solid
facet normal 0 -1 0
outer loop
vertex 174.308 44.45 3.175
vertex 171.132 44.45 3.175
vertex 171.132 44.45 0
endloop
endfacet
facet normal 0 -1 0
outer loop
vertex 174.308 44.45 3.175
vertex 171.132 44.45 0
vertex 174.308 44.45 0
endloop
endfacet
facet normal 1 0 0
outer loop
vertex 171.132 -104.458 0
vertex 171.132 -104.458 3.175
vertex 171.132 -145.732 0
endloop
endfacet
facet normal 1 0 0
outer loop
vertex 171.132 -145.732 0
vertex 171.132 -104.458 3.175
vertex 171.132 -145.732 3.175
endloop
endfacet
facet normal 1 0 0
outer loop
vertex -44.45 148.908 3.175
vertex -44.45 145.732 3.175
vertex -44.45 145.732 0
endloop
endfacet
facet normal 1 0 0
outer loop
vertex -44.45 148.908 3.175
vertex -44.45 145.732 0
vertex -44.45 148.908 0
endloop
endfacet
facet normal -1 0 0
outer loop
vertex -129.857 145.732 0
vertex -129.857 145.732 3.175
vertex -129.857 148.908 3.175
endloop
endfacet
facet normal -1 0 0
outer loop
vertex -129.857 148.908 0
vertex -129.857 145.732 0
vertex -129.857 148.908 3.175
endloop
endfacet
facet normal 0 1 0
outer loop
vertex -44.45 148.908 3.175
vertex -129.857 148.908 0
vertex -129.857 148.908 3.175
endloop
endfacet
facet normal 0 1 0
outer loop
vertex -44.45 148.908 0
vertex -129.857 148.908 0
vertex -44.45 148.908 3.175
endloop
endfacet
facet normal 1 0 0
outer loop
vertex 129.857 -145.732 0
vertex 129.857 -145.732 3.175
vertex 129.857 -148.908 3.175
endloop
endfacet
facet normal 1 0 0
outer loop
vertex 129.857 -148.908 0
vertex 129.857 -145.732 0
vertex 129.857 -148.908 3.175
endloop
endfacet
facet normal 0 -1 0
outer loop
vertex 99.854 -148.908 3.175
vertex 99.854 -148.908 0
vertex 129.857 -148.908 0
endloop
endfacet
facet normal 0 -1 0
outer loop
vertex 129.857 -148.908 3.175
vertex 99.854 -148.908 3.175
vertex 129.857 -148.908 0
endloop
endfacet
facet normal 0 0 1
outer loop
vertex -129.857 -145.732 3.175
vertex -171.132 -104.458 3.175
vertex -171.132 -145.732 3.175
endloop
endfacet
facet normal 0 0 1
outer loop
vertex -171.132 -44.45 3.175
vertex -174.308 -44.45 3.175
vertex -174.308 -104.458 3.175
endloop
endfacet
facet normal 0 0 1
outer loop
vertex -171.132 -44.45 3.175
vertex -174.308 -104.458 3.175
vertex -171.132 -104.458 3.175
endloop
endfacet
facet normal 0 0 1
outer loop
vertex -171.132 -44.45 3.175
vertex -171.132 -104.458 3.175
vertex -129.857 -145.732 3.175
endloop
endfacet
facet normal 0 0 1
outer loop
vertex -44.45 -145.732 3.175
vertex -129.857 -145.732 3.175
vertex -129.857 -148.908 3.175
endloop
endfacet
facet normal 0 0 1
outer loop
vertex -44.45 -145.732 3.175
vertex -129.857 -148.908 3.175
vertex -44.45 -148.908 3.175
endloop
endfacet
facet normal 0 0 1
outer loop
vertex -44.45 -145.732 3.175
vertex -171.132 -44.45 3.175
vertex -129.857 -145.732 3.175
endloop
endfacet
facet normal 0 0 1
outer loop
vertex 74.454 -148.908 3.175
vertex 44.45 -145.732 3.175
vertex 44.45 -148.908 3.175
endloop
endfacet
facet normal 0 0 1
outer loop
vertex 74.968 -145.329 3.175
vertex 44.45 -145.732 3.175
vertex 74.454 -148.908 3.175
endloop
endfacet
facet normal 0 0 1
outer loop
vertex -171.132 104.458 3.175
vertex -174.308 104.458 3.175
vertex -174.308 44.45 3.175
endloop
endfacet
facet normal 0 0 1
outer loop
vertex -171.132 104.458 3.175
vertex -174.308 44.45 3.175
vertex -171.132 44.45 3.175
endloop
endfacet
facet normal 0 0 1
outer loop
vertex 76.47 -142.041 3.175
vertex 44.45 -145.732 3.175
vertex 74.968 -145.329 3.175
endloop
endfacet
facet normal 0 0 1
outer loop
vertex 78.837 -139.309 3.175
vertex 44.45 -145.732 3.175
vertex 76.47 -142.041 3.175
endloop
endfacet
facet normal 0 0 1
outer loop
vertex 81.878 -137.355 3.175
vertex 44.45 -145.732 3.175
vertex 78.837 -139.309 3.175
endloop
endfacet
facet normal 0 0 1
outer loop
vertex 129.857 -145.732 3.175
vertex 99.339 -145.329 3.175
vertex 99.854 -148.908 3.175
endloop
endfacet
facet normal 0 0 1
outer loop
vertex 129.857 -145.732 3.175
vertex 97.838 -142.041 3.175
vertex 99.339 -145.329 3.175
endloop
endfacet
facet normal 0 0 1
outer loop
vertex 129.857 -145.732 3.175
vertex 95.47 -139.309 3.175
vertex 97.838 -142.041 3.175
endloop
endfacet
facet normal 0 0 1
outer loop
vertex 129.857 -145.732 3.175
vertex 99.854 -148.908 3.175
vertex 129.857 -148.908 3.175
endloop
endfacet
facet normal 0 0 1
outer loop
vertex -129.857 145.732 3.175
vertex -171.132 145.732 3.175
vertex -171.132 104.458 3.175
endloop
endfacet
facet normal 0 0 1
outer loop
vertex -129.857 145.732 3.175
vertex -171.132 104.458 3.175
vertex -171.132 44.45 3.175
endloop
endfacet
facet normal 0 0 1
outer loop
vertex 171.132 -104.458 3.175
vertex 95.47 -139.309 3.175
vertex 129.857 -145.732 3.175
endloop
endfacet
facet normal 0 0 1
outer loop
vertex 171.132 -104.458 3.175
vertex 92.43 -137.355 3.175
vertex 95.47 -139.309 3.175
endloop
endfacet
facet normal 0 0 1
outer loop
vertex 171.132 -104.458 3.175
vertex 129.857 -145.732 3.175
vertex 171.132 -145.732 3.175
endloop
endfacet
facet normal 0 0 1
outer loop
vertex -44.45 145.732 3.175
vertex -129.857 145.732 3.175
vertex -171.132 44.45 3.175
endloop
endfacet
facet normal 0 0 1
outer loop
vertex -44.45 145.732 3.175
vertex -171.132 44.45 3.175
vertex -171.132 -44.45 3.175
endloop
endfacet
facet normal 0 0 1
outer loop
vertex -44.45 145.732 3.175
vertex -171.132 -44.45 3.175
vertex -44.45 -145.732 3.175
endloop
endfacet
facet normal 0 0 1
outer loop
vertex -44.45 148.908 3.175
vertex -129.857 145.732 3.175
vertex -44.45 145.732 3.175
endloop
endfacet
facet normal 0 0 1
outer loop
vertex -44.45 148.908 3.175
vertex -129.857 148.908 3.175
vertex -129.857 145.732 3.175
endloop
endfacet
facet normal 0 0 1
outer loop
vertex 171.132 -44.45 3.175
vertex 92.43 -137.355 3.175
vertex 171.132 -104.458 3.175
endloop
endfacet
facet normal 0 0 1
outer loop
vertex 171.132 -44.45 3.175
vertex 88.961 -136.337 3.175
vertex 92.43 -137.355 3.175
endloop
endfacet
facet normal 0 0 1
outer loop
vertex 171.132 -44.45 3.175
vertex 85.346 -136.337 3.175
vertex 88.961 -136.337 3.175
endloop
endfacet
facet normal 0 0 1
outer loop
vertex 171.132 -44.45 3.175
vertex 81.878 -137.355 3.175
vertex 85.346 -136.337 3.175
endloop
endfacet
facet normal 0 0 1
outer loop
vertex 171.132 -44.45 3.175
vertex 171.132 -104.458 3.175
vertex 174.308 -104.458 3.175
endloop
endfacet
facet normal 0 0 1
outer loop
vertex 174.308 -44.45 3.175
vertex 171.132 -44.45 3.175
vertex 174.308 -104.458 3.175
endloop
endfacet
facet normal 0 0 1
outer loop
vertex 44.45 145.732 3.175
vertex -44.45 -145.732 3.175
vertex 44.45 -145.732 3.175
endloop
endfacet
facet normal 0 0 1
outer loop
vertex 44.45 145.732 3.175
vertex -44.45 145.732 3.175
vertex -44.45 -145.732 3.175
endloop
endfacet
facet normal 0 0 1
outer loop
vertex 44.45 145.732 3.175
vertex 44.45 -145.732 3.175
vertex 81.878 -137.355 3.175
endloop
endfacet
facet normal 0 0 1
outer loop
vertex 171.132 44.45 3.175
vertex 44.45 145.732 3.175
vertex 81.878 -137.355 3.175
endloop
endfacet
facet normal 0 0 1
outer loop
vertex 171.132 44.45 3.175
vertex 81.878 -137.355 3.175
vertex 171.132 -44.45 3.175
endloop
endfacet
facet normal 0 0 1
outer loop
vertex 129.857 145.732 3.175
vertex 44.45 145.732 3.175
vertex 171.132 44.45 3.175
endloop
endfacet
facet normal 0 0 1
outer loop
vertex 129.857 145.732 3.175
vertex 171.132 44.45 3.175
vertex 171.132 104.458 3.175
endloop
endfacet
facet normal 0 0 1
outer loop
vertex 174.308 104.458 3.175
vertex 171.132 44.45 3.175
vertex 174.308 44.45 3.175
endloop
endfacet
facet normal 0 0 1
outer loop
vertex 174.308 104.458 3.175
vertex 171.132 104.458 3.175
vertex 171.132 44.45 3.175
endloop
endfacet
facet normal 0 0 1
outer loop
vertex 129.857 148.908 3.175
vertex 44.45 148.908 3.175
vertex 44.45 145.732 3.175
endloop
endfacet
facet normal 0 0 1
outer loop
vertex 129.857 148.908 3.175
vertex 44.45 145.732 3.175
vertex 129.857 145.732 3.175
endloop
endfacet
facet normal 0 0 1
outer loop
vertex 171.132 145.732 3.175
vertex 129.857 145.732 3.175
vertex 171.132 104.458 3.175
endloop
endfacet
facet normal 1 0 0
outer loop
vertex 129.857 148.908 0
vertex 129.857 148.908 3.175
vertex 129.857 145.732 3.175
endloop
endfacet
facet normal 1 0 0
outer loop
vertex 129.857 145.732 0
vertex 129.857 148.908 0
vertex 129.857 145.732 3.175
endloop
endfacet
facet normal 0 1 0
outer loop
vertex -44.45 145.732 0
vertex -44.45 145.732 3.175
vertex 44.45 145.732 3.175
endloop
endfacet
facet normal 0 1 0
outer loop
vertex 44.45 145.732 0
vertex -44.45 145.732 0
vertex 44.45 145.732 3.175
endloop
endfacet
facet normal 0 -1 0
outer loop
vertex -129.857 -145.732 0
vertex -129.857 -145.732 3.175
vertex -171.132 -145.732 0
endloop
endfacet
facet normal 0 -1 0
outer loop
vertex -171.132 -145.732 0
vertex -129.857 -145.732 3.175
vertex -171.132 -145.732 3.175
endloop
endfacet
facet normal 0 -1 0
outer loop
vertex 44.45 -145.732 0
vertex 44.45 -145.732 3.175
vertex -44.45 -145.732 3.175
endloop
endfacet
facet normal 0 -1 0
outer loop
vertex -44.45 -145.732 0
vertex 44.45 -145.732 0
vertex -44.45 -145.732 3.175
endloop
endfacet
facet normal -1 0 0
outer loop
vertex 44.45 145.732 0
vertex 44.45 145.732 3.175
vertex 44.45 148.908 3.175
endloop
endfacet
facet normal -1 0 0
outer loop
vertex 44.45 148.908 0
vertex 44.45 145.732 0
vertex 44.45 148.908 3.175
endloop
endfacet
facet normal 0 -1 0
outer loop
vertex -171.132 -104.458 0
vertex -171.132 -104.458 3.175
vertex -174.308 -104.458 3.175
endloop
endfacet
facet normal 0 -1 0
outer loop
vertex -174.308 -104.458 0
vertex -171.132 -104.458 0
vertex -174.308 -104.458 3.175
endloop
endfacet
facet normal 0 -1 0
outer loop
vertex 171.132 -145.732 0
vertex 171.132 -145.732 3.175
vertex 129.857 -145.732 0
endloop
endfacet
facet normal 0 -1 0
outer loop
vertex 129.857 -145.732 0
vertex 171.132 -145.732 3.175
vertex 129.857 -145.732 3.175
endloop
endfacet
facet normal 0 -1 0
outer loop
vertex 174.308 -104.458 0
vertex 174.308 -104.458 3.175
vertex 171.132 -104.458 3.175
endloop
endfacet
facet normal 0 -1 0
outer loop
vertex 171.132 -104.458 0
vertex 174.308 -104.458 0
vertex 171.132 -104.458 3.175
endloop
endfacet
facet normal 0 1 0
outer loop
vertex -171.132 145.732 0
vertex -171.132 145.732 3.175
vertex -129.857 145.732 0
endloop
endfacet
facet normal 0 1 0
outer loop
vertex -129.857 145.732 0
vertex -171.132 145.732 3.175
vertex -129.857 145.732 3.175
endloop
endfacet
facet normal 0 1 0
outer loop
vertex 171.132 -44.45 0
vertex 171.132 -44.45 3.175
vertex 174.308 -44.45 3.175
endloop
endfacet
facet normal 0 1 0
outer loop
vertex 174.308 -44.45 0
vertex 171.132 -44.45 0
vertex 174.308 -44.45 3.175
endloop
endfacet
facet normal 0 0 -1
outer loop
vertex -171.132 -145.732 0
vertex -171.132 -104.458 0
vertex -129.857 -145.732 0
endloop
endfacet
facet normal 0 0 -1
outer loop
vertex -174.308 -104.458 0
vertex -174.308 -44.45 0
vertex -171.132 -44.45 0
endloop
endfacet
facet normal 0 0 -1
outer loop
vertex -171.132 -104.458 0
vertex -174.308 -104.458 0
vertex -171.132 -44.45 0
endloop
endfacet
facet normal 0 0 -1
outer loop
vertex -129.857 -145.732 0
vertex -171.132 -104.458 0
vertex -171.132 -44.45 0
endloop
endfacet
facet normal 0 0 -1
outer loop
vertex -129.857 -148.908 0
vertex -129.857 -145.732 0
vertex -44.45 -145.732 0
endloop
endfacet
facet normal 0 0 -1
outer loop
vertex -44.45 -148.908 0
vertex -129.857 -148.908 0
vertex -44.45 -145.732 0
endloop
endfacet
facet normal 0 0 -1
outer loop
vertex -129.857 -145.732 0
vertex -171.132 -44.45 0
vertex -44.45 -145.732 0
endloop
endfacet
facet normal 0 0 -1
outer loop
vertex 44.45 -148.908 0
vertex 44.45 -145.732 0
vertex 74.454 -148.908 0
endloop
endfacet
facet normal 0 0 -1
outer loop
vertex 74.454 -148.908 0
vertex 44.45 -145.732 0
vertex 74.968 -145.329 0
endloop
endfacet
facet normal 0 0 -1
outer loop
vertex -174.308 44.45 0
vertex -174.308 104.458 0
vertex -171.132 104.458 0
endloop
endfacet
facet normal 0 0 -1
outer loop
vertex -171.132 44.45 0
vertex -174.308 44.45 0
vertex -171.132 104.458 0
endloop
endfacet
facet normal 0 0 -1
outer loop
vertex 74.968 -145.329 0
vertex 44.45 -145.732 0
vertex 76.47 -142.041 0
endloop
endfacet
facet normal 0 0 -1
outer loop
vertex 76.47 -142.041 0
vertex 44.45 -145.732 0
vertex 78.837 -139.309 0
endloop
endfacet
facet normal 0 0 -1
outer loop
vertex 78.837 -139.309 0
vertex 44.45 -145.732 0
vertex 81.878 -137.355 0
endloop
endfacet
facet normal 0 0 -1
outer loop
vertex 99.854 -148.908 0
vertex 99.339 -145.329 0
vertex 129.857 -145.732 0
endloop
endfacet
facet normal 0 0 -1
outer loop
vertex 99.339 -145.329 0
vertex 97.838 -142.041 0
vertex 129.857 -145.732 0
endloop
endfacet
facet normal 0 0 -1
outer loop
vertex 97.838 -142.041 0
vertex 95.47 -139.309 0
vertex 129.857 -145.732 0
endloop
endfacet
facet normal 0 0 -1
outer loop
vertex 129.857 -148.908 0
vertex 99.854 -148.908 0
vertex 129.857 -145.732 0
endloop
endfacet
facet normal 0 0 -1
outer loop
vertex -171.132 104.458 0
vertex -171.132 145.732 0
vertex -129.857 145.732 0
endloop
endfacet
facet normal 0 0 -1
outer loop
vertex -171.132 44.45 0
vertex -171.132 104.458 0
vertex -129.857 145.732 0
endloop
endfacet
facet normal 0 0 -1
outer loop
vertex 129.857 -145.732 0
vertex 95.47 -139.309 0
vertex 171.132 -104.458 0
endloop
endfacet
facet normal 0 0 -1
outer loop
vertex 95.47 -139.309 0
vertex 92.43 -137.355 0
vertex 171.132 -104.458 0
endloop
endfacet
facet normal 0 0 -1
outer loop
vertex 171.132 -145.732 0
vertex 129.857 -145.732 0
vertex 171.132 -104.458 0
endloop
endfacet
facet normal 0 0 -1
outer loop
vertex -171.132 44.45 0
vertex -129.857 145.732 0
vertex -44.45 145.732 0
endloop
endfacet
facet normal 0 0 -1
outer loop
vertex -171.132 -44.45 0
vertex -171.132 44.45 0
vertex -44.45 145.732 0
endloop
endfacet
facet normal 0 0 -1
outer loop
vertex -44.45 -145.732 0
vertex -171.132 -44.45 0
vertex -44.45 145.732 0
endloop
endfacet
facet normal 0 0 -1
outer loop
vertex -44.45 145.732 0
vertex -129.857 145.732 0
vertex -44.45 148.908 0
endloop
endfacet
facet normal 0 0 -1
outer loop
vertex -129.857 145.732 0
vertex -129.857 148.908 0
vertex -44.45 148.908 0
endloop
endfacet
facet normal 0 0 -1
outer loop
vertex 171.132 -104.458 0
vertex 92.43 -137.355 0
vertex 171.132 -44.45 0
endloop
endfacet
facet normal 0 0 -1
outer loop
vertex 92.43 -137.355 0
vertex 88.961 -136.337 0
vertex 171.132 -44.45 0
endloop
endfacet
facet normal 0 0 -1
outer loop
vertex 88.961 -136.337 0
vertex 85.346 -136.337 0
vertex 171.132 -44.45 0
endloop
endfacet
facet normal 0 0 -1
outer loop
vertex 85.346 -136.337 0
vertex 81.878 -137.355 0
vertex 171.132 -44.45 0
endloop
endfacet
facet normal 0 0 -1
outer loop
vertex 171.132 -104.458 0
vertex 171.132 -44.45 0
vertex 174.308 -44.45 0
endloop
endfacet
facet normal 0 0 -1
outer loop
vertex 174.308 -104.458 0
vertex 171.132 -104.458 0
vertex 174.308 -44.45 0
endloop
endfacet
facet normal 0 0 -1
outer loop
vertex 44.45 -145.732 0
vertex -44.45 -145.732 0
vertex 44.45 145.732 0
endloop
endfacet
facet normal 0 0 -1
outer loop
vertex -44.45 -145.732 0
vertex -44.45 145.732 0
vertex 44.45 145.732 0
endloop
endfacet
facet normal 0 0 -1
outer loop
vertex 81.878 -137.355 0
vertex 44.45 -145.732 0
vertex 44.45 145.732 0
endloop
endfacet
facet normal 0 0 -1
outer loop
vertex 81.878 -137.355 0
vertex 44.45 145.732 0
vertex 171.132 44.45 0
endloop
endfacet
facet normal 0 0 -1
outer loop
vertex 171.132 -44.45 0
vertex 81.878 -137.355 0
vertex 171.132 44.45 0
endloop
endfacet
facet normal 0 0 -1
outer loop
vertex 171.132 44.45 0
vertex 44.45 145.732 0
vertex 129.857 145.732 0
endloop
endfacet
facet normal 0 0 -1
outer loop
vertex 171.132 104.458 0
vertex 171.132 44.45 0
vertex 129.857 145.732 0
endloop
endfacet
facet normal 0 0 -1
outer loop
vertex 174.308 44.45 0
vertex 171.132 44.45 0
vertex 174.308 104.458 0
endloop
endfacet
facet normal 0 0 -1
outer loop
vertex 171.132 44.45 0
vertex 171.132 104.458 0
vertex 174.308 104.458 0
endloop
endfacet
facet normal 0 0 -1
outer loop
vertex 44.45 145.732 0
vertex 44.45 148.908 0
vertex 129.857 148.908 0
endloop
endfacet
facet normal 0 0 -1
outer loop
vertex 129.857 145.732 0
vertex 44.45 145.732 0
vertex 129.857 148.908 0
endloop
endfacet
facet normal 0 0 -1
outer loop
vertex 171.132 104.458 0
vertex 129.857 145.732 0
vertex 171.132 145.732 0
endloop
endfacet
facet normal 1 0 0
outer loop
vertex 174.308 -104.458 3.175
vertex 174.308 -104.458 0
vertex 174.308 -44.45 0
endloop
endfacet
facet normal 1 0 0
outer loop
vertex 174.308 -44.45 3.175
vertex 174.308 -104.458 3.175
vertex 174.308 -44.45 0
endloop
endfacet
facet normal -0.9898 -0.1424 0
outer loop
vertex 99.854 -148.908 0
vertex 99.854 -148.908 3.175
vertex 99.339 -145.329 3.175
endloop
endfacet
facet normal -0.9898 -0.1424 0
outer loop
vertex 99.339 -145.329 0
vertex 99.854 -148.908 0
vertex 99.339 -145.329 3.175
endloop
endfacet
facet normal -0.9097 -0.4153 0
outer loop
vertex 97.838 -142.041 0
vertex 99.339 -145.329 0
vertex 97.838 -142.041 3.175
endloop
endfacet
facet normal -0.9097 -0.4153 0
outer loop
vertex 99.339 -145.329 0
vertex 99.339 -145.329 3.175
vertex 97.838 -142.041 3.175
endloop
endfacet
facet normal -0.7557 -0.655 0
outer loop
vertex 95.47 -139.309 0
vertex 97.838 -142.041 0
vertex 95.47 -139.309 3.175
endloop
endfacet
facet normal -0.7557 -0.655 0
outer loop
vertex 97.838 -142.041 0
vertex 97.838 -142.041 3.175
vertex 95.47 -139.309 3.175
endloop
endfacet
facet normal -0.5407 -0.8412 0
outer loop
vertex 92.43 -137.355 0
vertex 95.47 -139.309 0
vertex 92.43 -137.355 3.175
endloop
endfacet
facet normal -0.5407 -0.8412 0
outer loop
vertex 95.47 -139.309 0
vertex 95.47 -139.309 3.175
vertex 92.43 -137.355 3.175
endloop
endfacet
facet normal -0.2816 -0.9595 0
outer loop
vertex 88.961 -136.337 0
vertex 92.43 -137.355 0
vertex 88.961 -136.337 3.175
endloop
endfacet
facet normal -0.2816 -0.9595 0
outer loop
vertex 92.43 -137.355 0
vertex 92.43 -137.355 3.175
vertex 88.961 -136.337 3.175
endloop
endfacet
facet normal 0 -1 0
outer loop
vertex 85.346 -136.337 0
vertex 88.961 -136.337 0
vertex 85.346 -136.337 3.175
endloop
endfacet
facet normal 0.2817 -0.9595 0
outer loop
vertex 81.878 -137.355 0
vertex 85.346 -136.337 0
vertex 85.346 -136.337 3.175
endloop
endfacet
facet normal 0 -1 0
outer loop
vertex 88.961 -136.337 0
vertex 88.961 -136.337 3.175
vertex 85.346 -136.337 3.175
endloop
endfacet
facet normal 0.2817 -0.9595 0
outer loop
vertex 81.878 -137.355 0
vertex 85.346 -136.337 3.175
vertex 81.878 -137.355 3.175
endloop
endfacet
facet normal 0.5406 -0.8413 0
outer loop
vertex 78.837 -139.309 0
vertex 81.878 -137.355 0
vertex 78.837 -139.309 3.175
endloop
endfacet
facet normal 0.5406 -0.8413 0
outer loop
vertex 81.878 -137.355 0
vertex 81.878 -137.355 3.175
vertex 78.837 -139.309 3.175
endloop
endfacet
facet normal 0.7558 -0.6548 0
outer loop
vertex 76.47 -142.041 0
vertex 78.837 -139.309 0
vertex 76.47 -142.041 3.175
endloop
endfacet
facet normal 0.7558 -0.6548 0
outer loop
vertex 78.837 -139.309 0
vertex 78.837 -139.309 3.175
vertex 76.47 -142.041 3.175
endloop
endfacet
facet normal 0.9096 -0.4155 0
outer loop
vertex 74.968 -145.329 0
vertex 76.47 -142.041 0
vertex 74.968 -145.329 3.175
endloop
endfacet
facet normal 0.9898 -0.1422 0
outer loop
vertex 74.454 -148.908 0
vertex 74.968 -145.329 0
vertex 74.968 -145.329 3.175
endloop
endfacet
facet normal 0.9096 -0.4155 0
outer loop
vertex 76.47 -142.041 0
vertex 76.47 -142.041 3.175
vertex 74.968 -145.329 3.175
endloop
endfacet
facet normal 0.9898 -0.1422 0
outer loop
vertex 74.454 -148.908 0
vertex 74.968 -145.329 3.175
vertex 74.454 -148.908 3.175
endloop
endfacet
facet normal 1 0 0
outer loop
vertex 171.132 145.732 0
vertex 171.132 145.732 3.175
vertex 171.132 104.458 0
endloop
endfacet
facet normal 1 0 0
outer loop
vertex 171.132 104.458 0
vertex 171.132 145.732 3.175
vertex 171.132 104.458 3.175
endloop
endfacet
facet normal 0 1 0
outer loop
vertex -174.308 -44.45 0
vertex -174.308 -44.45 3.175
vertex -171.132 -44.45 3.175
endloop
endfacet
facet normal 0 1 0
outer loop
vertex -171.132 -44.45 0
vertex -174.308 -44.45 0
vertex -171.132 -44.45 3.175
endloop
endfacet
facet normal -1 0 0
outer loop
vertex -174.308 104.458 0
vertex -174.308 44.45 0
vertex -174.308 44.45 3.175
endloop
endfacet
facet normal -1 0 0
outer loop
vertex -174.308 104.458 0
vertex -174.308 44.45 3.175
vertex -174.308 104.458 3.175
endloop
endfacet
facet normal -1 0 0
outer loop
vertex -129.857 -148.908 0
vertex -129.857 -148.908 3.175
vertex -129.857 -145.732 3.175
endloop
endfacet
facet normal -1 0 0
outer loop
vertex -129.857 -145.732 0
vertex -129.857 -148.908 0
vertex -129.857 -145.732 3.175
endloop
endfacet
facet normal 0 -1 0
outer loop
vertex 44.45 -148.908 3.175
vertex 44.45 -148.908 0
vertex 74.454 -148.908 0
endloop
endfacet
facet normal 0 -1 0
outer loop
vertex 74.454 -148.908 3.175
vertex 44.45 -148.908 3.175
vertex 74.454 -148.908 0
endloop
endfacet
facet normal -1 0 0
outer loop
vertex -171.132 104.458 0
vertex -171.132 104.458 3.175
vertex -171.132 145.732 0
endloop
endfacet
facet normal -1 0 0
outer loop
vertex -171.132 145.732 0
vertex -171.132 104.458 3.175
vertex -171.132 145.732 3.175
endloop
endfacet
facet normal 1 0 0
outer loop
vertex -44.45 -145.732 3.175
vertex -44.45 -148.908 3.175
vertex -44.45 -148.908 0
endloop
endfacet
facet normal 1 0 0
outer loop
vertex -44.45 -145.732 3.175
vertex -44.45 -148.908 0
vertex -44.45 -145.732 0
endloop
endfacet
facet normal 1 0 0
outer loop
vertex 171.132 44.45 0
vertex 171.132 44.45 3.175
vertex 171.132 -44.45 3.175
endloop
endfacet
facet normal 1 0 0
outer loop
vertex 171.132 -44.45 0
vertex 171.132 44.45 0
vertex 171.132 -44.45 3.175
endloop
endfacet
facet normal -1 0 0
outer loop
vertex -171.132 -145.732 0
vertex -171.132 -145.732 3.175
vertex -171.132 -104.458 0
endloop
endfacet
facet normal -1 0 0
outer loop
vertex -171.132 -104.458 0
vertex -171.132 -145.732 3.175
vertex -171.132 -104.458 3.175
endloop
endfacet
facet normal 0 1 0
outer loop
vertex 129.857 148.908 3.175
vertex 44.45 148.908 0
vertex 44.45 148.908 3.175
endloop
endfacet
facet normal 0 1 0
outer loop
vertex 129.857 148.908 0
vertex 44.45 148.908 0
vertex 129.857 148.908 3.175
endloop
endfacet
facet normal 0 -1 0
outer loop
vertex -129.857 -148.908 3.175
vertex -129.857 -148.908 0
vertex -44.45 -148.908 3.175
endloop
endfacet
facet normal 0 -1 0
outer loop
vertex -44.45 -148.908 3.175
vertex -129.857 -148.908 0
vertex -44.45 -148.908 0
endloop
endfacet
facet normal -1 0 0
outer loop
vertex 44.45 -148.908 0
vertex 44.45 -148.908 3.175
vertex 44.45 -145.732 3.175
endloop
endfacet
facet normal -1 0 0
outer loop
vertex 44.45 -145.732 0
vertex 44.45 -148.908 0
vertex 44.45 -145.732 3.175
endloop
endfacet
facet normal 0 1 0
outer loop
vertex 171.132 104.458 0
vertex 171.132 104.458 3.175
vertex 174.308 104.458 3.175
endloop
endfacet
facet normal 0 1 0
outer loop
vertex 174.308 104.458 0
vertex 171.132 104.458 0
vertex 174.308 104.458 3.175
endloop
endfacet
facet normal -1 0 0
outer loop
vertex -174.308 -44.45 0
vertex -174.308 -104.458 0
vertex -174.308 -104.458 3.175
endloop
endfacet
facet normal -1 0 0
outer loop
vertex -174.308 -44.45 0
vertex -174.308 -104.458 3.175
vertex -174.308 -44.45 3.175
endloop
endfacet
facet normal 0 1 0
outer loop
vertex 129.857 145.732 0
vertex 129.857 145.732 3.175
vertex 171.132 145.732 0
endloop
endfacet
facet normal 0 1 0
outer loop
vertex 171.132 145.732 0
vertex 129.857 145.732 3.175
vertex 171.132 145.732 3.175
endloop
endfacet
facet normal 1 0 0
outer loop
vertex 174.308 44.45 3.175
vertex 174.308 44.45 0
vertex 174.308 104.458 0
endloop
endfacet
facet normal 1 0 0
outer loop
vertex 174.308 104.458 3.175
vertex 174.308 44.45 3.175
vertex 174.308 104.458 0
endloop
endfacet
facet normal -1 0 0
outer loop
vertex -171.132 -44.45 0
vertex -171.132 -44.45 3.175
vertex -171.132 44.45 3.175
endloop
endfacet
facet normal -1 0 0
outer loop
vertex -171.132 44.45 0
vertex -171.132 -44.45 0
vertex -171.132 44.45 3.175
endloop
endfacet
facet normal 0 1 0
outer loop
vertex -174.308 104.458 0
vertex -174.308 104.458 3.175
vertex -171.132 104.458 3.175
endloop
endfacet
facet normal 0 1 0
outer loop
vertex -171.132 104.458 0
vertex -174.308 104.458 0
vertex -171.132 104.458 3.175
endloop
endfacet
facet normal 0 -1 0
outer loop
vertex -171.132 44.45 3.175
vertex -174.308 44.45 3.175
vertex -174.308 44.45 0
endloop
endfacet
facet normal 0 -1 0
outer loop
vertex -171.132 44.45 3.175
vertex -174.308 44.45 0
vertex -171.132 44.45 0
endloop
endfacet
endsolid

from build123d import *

# Parameters (mm, degrees)
F0_W     = 348.615
F0_H     = 297.815
F1_DEPTH = 3.175
F2_W     = 44.45
F2_H     = 3.175
F2_W_2   = 3.175
F2_H_2   = 44.45
F3_DEPTH = 3.176
F5_DEPTH = 3.176


with BuildPart() as f1:
    # F0 (on Top) → F1 (new body)
    with BuildSketch(Plane.XY):
        Rectangle(F0_W, F0_H)
    extrude(amount=F1_DEPTH)

    # F2 (on face) → F3 (cut, through all)
    with BuildSketch(Plane.XY.offset(3.175)):
        Polygon((-129.8575, 145.7325), (-129.8575, 148.9075), (-174.3075, 148.9075), (-174.3075, 104.4575), (-171.1325, 104.4575), (-171.1325, 145.7325), align=None)
        with Locations((-22.225, 147.32)):
            Rectangle(F2_W, F2_H)
        with Locations((22.225, 147.32)):
            Rectangle(F2_W, F2_H)
        with Locations((-172.72, 22.225)):
            Rectangle(F2_W_2, F2_H_2)
        with Locations((-172.72, -22.225)):
            Rectangle(F2_W_2, F2_H_2)
        with Locations((172.72, -22.225)):
            Rectangle(F2_W_2, F2_H_2)
        with Locations((172.72, 22.225)):
            Rectangle(F2_W_2, F2_H_2)
        Polygon((171.1325, 145.7325), (171.1325, 104.4575), (174.3075, 104.4575), (174.3075, 148.9075), (129.8575, 148.9075), (129.8575, 145.7325), align=None)
        with Locations((-22.225, -147.32)):
            Rectangle(F2_W, F2_H)
        with Locations((22.225, -147.32)):
            Rectangle(F2_W, F2_H)
        Polygon((-171.1325, -145.7325), (-171.1325, -104.4575), (-174.3075, -104.4575), (-174.3075, -148.9075), (-129.8575, -148.9075), (-129.8575, -145.7325), align=None)
        Polygon((129.8575, -145.7325), (129.8575, -148.9075), (174.3075, -148.9075), (174.3075, -104.4575), (171.1325, -104.4575), (171.1325, -145.7325), align=None)
    extrude(amount=-F3_DEPTH, mode=Mode.SUBTRACT)

    # F4 (on face) → F5 (cut, through all)
    with BuildSketch(Plane.XY.offset(3.175)):
        with BuildLine():
            Line((74.45375, -148.9075), (99.85375, -148.9075))
            ThreePointArc((99.85375, -148.9075), (87.15375, -136.2075), (74.45375, -148.9075))
        make_face()
    extrude(amount=-F5_DEPTH, mode=Mode.SUBTRACT)


solid = f1.part
